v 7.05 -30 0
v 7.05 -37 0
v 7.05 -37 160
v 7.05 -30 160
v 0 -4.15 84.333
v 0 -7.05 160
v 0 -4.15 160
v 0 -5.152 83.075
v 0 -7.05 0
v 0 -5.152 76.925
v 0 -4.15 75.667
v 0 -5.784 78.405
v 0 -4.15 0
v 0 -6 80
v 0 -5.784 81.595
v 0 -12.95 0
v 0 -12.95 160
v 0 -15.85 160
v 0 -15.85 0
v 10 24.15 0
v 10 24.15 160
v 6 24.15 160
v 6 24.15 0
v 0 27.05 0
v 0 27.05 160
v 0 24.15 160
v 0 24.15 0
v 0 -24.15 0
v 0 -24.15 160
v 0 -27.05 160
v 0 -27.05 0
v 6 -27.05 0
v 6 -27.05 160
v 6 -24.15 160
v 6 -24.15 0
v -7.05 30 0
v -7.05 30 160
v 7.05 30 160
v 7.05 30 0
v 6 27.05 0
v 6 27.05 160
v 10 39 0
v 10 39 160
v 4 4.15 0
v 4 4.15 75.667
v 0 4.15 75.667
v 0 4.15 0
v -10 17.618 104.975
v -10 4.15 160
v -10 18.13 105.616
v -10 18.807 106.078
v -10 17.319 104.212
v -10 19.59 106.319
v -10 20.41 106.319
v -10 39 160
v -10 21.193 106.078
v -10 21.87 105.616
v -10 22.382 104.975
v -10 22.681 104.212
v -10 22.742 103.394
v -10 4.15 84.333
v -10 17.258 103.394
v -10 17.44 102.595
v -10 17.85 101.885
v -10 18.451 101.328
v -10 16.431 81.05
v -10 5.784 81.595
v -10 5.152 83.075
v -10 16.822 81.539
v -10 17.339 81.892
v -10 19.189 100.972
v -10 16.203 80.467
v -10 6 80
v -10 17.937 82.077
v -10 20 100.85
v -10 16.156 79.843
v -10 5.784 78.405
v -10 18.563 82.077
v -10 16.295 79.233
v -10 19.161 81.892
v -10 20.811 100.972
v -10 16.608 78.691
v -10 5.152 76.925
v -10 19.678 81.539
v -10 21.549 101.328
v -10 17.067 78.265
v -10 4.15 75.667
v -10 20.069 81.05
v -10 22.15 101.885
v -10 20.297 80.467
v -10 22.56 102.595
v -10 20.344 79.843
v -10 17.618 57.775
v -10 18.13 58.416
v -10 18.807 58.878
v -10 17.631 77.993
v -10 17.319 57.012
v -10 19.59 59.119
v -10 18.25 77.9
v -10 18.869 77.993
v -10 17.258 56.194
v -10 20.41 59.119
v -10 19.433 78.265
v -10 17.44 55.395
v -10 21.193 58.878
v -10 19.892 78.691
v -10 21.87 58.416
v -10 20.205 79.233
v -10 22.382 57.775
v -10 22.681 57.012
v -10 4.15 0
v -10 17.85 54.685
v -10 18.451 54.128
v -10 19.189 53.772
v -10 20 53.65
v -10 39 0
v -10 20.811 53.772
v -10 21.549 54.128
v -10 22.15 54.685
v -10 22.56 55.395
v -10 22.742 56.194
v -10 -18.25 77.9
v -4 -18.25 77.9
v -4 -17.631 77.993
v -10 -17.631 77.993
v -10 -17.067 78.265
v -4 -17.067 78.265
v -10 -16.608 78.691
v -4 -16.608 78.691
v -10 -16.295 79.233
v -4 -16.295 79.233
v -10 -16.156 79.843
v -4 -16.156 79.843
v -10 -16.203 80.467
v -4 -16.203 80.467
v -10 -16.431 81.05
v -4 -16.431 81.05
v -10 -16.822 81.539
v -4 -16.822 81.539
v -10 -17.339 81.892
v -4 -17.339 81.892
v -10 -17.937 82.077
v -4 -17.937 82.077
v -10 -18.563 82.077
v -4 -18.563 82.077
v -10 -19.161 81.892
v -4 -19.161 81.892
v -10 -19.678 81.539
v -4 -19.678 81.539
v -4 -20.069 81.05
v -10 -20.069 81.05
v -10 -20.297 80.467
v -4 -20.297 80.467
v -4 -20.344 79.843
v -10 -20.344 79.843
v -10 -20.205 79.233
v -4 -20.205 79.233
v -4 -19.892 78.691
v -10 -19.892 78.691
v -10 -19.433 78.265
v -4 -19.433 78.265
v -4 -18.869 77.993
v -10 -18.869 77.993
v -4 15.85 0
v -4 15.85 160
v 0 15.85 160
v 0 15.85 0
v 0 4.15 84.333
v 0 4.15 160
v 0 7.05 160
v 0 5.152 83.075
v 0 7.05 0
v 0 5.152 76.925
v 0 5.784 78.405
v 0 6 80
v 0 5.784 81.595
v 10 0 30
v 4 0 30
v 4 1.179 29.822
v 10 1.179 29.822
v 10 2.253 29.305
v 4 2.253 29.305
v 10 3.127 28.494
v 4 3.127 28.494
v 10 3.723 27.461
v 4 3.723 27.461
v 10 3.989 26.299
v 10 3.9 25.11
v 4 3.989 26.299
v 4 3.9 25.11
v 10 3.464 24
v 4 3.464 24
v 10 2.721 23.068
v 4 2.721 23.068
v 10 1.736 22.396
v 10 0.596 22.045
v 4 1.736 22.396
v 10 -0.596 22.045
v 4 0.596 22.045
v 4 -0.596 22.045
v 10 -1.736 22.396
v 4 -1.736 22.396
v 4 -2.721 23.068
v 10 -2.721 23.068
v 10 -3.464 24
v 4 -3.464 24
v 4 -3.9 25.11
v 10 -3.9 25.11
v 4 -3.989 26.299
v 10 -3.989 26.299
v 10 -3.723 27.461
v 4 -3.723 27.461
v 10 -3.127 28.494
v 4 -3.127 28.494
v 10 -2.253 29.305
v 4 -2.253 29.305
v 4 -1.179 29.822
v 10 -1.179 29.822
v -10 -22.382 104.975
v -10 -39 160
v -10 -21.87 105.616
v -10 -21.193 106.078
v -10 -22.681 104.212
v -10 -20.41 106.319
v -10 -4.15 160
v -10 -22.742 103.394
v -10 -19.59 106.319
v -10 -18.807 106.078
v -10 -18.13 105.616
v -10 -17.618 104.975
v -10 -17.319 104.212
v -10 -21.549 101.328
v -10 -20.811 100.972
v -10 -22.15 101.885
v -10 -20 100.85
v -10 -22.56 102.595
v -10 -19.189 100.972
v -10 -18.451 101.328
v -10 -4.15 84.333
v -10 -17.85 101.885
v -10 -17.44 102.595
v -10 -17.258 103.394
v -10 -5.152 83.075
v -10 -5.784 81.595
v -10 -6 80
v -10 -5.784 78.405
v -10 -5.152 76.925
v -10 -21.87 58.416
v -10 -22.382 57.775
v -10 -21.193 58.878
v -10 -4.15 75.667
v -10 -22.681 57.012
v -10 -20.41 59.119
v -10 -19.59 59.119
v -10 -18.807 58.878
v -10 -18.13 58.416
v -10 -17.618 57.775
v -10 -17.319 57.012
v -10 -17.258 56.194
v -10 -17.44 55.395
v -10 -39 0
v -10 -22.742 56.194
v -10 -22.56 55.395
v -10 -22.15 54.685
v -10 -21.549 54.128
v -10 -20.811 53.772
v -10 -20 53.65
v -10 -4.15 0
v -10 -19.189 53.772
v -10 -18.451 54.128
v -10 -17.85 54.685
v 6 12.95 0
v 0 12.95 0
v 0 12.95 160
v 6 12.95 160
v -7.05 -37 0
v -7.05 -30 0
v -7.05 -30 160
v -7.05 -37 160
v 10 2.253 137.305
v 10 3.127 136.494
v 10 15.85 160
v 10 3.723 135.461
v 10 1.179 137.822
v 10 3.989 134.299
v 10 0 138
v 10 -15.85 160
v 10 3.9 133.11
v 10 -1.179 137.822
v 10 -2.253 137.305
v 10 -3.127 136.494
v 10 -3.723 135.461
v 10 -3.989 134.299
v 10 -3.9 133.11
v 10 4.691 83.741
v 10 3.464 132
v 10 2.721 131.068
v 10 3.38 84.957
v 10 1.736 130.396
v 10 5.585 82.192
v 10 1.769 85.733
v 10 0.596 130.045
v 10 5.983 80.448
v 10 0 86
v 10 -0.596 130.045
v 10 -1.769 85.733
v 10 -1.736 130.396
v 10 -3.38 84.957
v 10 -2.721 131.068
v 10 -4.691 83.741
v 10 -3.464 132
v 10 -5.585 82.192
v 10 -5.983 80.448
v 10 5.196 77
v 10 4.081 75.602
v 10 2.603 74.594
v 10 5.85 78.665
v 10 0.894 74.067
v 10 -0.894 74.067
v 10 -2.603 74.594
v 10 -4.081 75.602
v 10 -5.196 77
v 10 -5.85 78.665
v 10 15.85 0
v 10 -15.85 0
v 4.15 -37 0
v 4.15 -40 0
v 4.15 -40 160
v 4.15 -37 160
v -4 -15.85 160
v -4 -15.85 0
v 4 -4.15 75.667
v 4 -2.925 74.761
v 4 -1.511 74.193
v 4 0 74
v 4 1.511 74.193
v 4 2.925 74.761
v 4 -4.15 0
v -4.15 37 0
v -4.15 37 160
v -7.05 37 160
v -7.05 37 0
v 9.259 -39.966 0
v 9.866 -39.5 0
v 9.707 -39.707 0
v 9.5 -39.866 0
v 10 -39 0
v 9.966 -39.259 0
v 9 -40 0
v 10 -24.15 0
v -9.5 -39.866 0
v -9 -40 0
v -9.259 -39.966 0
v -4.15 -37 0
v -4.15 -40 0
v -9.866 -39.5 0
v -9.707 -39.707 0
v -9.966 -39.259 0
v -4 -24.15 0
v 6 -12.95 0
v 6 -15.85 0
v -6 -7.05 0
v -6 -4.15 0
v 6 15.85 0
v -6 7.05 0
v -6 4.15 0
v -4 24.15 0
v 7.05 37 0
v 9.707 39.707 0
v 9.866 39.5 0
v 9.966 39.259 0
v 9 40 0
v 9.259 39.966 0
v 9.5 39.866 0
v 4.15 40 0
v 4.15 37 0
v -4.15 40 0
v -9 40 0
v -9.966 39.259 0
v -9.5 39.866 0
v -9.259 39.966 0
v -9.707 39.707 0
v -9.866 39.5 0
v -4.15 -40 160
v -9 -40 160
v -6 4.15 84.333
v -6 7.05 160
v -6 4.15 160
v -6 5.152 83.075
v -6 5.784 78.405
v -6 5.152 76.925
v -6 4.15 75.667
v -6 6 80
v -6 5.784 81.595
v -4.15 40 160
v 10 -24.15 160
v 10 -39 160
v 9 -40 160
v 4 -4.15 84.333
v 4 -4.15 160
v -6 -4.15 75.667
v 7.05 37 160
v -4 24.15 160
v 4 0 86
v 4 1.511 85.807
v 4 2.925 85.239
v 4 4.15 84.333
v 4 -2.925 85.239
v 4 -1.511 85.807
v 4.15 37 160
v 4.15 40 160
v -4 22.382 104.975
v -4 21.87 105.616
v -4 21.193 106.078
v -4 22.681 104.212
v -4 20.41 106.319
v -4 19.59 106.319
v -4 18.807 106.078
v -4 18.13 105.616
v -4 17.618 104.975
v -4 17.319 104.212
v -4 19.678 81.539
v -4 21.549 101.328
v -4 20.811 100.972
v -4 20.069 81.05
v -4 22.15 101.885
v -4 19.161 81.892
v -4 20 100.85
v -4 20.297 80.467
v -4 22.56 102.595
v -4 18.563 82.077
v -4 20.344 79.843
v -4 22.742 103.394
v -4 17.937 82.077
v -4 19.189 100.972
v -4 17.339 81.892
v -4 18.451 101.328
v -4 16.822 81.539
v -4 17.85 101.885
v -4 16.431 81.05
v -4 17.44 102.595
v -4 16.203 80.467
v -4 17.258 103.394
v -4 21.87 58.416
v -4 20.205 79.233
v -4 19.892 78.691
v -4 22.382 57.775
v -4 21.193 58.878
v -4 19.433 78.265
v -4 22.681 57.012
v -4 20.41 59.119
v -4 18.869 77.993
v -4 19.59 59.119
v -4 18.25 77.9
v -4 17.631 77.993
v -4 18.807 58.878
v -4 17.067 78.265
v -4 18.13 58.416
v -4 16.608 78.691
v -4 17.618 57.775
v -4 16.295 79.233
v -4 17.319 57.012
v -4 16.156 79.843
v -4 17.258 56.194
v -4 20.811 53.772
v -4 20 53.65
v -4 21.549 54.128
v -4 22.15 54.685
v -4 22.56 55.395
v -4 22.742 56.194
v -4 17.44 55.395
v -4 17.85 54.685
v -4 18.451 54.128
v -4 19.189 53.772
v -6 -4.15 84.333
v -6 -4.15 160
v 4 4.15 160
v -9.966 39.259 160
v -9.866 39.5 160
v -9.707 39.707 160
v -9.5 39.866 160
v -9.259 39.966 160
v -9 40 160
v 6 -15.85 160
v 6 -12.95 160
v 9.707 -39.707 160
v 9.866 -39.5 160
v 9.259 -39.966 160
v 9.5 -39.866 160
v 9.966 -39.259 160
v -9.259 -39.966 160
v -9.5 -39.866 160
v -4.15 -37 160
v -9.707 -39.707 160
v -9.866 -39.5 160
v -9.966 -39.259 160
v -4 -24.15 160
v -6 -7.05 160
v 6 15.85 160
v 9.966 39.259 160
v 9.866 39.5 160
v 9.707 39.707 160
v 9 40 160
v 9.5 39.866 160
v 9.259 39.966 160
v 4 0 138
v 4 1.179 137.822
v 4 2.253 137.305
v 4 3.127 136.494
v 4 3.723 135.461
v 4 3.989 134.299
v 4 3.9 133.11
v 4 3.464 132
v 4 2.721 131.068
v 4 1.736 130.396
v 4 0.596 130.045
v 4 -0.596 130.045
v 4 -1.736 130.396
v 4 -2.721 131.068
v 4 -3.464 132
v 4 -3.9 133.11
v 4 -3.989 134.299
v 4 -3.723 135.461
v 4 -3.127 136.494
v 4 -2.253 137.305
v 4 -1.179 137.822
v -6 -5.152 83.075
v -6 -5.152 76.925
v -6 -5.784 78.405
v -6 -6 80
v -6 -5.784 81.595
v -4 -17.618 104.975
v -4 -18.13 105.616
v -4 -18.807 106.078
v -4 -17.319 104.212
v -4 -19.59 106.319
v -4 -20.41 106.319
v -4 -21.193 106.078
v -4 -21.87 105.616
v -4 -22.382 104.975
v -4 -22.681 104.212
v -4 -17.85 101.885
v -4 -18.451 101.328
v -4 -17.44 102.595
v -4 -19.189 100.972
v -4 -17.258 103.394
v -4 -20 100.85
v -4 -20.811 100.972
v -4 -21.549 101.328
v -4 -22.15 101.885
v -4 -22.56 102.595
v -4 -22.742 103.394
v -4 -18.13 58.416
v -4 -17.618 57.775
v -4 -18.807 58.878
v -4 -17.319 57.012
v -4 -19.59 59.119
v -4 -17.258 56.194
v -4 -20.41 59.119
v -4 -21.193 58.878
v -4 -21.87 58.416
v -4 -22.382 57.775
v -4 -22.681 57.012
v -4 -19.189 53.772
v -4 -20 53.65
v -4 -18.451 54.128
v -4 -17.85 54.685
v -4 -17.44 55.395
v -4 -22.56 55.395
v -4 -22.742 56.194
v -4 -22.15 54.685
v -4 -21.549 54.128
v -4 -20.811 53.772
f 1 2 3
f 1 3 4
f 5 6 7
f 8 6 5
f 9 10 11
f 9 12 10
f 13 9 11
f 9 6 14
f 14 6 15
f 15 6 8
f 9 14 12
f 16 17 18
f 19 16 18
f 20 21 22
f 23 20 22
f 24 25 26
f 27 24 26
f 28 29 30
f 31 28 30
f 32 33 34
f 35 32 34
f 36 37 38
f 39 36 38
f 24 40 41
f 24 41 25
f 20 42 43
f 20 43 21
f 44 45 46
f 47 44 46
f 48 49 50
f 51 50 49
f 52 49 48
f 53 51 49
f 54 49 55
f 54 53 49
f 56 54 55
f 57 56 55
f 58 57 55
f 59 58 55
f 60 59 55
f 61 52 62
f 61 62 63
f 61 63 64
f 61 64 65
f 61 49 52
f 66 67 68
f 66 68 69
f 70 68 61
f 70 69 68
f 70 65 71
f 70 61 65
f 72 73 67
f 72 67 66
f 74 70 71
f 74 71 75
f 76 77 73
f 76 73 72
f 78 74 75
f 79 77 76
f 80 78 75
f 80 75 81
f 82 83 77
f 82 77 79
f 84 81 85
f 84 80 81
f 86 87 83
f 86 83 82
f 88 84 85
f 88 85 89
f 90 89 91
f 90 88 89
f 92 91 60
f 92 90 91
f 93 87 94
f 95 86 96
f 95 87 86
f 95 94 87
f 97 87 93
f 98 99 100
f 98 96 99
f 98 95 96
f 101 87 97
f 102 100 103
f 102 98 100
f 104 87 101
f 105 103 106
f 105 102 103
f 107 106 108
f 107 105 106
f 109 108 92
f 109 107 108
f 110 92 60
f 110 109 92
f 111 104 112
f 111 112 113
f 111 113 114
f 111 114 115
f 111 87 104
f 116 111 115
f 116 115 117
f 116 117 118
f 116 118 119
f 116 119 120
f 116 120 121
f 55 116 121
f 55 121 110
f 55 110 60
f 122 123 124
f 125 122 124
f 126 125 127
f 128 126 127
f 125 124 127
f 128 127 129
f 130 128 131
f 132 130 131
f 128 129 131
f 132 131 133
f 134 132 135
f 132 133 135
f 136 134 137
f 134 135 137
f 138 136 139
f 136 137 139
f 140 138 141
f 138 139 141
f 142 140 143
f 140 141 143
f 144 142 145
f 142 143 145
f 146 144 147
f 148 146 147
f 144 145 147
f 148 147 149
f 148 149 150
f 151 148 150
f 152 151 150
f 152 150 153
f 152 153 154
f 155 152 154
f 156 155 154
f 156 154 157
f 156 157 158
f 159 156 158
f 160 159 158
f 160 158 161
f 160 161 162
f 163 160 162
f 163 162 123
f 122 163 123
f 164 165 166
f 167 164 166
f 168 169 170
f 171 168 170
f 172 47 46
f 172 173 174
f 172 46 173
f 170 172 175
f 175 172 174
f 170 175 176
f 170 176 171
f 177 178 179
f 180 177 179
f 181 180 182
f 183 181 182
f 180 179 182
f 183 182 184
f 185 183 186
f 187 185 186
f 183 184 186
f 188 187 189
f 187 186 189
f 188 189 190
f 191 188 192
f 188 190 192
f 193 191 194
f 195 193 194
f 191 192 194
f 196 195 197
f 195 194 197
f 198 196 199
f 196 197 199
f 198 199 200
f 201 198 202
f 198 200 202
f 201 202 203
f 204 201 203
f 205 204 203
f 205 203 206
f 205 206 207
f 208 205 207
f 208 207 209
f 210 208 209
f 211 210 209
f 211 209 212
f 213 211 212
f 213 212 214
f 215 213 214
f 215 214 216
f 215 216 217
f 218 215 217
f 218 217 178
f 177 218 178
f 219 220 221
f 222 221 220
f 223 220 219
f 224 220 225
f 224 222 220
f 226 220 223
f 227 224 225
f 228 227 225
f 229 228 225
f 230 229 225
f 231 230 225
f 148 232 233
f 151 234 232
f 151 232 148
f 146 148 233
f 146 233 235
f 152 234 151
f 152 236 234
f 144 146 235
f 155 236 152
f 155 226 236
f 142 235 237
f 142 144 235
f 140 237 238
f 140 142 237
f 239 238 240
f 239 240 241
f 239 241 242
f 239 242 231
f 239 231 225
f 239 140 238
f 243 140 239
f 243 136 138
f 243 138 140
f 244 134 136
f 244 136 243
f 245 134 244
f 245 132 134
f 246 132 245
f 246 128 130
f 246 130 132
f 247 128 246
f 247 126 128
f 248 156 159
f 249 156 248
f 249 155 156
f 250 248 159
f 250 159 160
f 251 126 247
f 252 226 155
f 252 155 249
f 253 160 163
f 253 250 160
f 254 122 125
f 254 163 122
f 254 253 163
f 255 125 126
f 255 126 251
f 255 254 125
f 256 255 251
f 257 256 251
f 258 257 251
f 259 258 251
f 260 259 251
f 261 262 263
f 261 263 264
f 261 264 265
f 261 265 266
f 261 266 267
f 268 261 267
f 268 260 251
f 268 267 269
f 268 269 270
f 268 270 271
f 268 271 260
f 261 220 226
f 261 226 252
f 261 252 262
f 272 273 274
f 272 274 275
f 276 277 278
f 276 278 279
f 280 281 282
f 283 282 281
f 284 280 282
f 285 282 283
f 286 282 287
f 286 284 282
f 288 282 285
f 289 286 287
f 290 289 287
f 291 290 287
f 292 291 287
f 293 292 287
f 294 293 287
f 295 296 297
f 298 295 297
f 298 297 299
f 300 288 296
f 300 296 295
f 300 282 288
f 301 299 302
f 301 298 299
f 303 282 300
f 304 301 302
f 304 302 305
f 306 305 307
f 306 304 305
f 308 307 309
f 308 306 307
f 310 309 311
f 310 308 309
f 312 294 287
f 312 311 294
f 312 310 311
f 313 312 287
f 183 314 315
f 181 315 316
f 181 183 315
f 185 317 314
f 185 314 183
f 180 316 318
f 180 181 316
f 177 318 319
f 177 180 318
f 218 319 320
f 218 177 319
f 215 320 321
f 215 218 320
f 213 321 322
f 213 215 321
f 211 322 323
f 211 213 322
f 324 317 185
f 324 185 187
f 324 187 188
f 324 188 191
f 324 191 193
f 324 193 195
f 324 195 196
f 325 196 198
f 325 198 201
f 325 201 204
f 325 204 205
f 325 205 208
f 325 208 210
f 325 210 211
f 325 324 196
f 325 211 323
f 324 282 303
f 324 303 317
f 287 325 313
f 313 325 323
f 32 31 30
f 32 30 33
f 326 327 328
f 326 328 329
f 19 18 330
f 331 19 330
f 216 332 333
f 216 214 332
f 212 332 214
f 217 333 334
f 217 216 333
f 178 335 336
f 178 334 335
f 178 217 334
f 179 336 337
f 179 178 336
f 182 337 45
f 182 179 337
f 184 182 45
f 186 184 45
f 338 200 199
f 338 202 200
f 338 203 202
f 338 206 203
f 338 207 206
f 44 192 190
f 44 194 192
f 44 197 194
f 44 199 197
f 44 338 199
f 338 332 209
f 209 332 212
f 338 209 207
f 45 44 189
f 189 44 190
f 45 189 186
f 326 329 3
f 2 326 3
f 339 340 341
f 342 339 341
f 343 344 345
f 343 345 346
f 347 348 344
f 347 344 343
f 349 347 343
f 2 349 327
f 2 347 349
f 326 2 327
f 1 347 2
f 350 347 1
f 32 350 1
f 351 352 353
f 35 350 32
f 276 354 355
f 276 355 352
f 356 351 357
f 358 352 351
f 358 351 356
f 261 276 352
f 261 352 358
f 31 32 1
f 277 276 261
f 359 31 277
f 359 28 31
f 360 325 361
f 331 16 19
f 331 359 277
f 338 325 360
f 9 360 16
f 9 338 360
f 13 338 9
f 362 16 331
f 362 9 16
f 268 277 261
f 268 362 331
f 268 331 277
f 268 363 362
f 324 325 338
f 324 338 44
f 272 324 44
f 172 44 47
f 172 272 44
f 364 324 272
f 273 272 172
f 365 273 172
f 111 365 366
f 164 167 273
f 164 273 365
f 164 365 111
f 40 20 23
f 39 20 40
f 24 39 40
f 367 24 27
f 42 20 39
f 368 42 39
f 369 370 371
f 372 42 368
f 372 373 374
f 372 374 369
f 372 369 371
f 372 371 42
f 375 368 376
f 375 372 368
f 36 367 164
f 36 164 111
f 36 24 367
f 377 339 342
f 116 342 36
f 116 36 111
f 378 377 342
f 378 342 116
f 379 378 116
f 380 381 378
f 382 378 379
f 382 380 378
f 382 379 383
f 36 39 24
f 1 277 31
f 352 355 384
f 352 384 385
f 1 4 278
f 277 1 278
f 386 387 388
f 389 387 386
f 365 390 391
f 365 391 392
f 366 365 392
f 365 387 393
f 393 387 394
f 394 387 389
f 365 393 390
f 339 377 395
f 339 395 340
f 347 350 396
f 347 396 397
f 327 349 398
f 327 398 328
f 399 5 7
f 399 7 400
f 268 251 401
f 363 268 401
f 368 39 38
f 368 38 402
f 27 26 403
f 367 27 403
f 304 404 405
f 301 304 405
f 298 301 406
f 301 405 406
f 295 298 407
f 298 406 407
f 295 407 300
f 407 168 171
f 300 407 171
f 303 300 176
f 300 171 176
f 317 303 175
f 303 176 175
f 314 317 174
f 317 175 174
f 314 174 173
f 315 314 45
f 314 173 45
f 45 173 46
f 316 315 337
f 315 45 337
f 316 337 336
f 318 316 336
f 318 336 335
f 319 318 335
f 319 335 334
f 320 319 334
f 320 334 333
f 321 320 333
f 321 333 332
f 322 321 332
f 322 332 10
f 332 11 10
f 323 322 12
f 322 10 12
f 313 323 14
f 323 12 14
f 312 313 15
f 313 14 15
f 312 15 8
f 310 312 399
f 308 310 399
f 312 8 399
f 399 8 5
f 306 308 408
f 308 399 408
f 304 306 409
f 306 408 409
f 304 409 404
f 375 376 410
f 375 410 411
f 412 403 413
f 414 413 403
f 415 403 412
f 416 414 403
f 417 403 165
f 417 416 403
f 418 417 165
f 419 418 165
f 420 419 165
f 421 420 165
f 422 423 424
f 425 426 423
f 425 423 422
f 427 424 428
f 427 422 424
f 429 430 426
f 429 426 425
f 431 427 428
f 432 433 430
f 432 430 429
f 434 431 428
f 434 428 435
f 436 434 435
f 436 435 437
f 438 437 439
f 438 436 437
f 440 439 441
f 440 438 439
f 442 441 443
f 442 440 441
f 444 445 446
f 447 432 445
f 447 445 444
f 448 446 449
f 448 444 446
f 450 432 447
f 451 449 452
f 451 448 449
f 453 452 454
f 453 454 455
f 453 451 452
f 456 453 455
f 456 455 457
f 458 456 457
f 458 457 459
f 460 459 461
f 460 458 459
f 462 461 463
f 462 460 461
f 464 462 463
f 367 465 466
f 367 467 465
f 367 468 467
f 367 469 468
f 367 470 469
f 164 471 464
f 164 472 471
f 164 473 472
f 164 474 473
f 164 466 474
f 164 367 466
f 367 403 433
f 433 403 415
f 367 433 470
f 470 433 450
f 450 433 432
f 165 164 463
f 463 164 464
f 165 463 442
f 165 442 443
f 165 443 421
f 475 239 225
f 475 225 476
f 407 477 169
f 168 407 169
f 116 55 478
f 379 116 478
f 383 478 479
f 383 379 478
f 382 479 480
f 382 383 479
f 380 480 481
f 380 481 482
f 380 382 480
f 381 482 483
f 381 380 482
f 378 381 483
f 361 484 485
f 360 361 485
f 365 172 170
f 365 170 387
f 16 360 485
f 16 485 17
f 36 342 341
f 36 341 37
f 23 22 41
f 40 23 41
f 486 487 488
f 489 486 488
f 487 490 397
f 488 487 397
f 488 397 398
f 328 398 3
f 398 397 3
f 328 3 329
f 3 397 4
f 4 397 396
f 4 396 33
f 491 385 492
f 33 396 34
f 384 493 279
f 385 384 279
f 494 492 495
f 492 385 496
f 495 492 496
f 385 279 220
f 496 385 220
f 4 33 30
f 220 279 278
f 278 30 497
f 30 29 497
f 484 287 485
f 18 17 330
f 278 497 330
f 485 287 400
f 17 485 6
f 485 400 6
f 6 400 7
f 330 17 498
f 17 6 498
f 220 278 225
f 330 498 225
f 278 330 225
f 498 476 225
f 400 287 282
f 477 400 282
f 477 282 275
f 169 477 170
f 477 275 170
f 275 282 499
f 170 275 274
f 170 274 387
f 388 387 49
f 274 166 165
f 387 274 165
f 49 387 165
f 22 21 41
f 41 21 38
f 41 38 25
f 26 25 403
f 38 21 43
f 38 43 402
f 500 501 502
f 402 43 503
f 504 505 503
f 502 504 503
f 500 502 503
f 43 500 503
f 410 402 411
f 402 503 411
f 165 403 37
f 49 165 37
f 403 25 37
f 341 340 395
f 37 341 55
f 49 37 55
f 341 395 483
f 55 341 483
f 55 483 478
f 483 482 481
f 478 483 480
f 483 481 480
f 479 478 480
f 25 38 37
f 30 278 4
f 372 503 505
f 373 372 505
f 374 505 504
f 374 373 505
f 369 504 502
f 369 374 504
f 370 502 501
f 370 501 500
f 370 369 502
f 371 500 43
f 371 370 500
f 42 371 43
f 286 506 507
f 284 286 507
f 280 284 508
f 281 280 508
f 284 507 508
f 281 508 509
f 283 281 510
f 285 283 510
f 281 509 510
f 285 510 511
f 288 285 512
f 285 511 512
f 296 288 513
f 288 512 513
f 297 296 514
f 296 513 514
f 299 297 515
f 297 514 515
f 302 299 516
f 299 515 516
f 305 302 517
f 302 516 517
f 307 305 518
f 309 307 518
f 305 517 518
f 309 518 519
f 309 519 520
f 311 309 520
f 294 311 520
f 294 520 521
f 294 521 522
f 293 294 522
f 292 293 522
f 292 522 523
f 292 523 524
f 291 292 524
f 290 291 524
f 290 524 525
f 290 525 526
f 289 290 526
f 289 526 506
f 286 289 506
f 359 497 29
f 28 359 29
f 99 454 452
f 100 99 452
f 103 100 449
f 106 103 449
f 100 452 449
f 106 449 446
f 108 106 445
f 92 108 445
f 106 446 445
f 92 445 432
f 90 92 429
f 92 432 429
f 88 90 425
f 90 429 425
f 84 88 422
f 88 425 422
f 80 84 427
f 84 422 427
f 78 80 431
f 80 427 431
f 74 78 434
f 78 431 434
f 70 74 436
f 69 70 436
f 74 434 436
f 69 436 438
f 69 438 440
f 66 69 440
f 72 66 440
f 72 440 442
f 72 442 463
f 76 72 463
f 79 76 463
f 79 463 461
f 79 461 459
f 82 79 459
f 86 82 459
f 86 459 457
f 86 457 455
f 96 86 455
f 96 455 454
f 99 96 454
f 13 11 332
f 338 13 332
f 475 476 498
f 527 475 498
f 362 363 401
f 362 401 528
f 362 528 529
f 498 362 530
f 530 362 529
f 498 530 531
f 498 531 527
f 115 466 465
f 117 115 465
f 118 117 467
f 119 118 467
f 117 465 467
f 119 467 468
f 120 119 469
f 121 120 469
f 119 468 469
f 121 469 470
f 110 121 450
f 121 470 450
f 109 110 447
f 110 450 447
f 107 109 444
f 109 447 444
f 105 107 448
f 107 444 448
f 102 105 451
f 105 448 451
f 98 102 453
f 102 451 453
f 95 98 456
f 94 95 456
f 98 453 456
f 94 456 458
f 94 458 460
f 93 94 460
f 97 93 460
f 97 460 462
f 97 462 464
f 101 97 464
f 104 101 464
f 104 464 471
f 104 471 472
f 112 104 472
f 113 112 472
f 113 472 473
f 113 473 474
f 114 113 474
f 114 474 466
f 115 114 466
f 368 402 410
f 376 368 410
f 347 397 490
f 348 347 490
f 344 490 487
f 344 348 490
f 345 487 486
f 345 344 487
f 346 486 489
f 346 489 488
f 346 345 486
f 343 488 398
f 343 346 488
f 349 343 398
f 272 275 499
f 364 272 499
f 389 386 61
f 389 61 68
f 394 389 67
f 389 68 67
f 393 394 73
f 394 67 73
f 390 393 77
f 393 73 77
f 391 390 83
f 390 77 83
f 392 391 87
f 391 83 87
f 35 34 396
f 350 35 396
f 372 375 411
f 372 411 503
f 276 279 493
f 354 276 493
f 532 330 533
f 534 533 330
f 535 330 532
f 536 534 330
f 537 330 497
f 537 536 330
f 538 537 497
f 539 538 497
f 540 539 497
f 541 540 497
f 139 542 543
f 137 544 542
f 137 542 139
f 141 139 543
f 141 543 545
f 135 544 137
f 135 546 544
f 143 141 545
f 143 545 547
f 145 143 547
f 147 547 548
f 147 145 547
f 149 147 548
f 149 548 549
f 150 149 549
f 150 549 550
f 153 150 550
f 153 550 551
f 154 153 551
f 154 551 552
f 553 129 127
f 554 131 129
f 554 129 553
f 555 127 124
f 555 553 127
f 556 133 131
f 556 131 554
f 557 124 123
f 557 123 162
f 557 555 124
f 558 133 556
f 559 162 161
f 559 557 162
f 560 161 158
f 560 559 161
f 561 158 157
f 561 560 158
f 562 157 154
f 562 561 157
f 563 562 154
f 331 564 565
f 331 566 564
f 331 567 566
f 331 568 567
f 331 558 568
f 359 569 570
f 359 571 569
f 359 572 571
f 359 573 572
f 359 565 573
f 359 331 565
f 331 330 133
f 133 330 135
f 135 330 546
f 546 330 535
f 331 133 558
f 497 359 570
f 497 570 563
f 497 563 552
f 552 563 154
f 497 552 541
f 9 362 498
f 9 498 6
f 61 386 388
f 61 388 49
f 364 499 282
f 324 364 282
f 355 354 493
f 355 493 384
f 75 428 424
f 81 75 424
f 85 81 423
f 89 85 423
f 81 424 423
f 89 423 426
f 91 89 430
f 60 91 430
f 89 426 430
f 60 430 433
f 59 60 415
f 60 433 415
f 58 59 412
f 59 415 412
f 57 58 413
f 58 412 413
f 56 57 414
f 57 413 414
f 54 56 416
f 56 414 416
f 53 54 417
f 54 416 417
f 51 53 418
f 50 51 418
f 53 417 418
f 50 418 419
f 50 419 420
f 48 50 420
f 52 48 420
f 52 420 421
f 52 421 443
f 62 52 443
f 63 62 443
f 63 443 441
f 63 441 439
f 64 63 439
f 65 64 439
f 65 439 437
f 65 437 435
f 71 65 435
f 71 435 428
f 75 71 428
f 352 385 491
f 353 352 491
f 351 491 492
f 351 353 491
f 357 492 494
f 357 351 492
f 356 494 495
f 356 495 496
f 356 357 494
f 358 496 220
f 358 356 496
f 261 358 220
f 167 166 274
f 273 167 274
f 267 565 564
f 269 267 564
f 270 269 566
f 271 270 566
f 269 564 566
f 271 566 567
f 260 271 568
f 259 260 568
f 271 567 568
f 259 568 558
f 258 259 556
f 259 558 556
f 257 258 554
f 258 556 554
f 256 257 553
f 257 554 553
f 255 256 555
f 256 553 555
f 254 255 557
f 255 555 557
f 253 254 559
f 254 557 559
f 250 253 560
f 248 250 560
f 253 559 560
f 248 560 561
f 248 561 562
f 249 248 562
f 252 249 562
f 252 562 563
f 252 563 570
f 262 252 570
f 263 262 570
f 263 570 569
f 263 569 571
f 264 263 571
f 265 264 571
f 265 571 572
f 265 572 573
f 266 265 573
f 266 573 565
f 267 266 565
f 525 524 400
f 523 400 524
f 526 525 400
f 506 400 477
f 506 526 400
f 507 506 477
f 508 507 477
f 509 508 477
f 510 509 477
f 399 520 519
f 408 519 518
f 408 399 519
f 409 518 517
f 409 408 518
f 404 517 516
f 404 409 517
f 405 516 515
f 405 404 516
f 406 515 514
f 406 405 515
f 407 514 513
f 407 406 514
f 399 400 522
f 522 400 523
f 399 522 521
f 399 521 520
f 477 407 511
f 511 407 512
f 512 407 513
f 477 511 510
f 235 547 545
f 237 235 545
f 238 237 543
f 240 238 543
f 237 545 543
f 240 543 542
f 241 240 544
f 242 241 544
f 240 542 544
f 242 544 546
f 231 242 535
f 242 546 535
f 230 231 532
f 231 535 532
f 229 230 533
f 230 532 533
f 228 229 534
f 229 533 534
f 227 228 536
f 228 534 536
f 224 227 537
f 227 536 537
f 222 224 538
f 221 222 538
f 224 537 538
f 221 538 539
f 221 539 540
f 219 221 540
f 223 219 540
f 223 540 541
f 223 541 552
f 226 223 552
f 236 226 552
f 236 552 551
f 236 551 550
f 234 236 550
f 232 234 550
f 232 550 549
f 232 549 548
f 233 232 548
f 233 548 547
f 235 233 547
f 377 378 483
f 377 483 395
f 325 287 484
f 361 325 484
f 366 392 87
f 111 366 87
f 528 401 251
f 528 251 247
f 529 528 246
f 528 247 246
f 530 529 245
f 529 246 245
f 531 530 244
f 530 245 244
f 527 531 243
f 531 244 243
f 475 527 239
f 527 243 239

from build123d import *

# Parameters (mm, degrees)
EXTRUDE_1_DEPTH           = 160
HOLE_WIZARD_8_0_8_1_D     = 8
HOLE_WIZARD_8_0_8_2_D     = 8
HOLE_WIZARD_8_0_8_2_DEPTH = 8
HOLE_WIZARD_8_0_8_2_TIP   = 2.403442476
HOLE_WIZARD_12_0_12_2_D   = 12
HOLE_WIZARD_5_5_5_5_1_D   = 5.5
HOLE_WIZARD_5_5_5_5_2_D   = 5.5
HOLE_WIZARD_5_5_5_5_3_D   = 5.5
HOLE_WIZARD_5_5_5_5_4_D   = 5.5
HOLE_WIZARD_M5_1_D        = 4.2
HOLE_WIZARD_M5_2_D        = 4.2


with BuildPart() as part:
    # Sketch1 → 凸台-拉伸1 (new body)
    with BuildSketch(Plane.XY):
        with BuildLine():
            Line((-9, 40), (-4.15, 40))
            Line((-4.15, 40), (-4.15, 37))
            Line((-4.15, 37), (-7.05, 37))
            Line((-7.05, 37), (-7.05, 30))
            Line((-7.05, 30), (7.05, 30))
            Line((7.05, 30), (7.05, 37))
            Line((7.05, 37), (4.15, 37))
            Line((4.15, 37), (4.15, 40))
            Line((4.15, 40), (9, 40))
            ThreePointArc((9, 40), (9.707106781, 39.707106781), (10, 39))
            Line((10, 39), (10, 24.15))
            Line((10, 24.15), (6, 24.15))
            Line((6, 24.15), (6, 27.05))
            Line((6, 27.05), (0, 27.05))
            Line((0, 27.05), (0, 24.15))
            Line((0, 24.15), (-4, 24.15))
            Line((-4, 24.15), (-4, 15.85))
            Line((-4, 15.85), (0, 15.85))
            Line((0, 15.85), (0, 12.95))
            Line((0, 12.95), (6, 12.95))
            Line((6, 12.95), (6, 15.85))
            Line((6, 15.85), (10, 15.85))
            Line((10, 15.85), (10, -15.85))
            Line((10, -15.85), (6, -15.85))
            Line((6, -15.85), (6, -12.95))
            Line((6, -12.95), (0, -12.95))
            Line((0, -12.95), (0, -15.85))
            Line((0, -15.85), (-4, -15.85))
            Line((-4, -15.85), (-4, -24.15))
            Line((-4, -24.15), (0, -24.15))
            Line((0, -24.15), (0, -27.05))
            Line((0, -27.05), (6, -27.05))
            Line((6, -27.05), (6, -24.15))
            Line((6, -24.15), (10, -24.15))
            Line((10, -24.15), (10, -39))
            ThreePointArc((10, -39), (9.707106781, -39.707106781), (9, -40))
            Line((9, -40), (4.15, -40))
            Line((4.15, -40), (4.15, -37))
            Line((4.15, -37), (7.05, -37))
            Line((7.05, -37), (7.05, -30))
            Line((7.05, -30), (-7.05, -30))
            Line((-7.05, -30), (-7.05, -37))
            Line((-7.05, -37), (-4.15, -37))
            Line((-4.15, -37), (-4.15, -40))
            Line((-4.15, -40), (-9, -40))
            ThreePointArc((-9, -40), (-9.707106781, -39.707106781), (-10, -39))
            Line((-10, -39), (-10, -4.15))
            Line((-10, -4.15), (-6, -4.15))
            Line((-6, -4.15), (-6, -7.05))
            Line((-6, -7.05), (0, -7.05))
            Line((0, -7.05), (0, -4.15))
            Line((0, -4.15), (4, -4.15))
            Line((4, -4.15), (4, 4.15))
            Line((4, 4.15), (0, 4.15))
            Line((0, 4.15), (0, 7.05))
            Line((0, 7.05), (-6, 7.05))
            Line((-6, 7.05), (-6, 4.15))
            Line((-6, 4.15), (-10, 4.15))
            Line((-10, 4.15), (-10, 39))
            ThreePointArc((-10, 39), (-9.707106781, 39.707106781), (-9, 40))
        make_face()
    extrude(amount=EXTRUDE_1_DEPTH)

    # Ø8.0 (8) 直径孔1 (through all)
    with Locations(Plane(origin=(10, 0, 0), x_dir=(0, 0, -1), z_dir=(1, 0, 0))):
        with Locations((-134, 0)):
            Hole(HOLE_WIZARD_8_0_8_1_D / 2)

    # Ø8.0 (8) 直径孔2
    with Locations(Plane(origin=(10, 0, 0), x_dir=(0, 0, -1), z_dir=(1, 0, 0))):
        with Locations((-26, 0)):
            Hole(HOLE_WIZARD_8_0_8_2_D / 2, depth=HOLE_WIZARD_8_0_8_2_DEPTH)
            with Locations((0, 0, -(HOLE_WIZARD_8_0_8_2_DEPTH + HOLE_WIZARD_8_0_8_2_TIP / 2))):  # 118° drill point
                Cone(0, HOLE_WIZARD_8_0_8_2_D / 2, HOLE_WIZARD_8_0_8_2_TIP, mode=Mode.SUBTRACT)

    # Ø12.0 (12) 直径孔2 (through all)
    with Locations(Plane(origin=(10, 0, 0), x_dir=(0, 0, -1), z_dir=(1, 0, 0))):
        with Locations((-80, 0)):
            Hole(HOLE_WIZARD_12_0_12_2_D / 2)

    # Ø5.5 (5.5) 直径孔1 (through all)
    with Locations(Plane.ZY.offset(10)):
        with Locations((103.6, -20)):
            Hole(HOLE_WIZARD_5_5_5_5_1_D / 2)

    # Ø5.5 (5.5) 直径孔2 (through all)
    with Locations(Plane.ZY.offset(10)):
        with Locations((56.4, -20)):
            Hole(HOLE_WIZARD_5_5_5_5_2_D / 2)

    # Ø5.5 (5.5) 直径孔3 (through all)
    with Locations(Plane.ZY.offset(10)):
        with Locations((103.6, 20)):
            Hole(HOLE_WIZARD_5_5_5_5_3_D / 2)

    # Ø5.5 (5.5) 直径孔4 (through all)
    with Locations(Plane.ZY.offset(10)):
        with Locations((56.4, 20)):
            Hole(HOLE_WIZARD_5_5_5_5_4_D / 2)

    # M5 螺纹孔1 (through all)
    with Locations(Plane.ZY.offset(10)):
        with Locations((80, -18.25)):
            Hole(HOLE_WIZARD_M5_1_D / 2)

    # M5 螺纹孔2 (through all)
    with Locations(Plane.ZY.offset(10)):
        with Locations((80, 18.25)):
            Hole(HOLE_WIZARD_M5_2_D / 2)


solid = part.part
